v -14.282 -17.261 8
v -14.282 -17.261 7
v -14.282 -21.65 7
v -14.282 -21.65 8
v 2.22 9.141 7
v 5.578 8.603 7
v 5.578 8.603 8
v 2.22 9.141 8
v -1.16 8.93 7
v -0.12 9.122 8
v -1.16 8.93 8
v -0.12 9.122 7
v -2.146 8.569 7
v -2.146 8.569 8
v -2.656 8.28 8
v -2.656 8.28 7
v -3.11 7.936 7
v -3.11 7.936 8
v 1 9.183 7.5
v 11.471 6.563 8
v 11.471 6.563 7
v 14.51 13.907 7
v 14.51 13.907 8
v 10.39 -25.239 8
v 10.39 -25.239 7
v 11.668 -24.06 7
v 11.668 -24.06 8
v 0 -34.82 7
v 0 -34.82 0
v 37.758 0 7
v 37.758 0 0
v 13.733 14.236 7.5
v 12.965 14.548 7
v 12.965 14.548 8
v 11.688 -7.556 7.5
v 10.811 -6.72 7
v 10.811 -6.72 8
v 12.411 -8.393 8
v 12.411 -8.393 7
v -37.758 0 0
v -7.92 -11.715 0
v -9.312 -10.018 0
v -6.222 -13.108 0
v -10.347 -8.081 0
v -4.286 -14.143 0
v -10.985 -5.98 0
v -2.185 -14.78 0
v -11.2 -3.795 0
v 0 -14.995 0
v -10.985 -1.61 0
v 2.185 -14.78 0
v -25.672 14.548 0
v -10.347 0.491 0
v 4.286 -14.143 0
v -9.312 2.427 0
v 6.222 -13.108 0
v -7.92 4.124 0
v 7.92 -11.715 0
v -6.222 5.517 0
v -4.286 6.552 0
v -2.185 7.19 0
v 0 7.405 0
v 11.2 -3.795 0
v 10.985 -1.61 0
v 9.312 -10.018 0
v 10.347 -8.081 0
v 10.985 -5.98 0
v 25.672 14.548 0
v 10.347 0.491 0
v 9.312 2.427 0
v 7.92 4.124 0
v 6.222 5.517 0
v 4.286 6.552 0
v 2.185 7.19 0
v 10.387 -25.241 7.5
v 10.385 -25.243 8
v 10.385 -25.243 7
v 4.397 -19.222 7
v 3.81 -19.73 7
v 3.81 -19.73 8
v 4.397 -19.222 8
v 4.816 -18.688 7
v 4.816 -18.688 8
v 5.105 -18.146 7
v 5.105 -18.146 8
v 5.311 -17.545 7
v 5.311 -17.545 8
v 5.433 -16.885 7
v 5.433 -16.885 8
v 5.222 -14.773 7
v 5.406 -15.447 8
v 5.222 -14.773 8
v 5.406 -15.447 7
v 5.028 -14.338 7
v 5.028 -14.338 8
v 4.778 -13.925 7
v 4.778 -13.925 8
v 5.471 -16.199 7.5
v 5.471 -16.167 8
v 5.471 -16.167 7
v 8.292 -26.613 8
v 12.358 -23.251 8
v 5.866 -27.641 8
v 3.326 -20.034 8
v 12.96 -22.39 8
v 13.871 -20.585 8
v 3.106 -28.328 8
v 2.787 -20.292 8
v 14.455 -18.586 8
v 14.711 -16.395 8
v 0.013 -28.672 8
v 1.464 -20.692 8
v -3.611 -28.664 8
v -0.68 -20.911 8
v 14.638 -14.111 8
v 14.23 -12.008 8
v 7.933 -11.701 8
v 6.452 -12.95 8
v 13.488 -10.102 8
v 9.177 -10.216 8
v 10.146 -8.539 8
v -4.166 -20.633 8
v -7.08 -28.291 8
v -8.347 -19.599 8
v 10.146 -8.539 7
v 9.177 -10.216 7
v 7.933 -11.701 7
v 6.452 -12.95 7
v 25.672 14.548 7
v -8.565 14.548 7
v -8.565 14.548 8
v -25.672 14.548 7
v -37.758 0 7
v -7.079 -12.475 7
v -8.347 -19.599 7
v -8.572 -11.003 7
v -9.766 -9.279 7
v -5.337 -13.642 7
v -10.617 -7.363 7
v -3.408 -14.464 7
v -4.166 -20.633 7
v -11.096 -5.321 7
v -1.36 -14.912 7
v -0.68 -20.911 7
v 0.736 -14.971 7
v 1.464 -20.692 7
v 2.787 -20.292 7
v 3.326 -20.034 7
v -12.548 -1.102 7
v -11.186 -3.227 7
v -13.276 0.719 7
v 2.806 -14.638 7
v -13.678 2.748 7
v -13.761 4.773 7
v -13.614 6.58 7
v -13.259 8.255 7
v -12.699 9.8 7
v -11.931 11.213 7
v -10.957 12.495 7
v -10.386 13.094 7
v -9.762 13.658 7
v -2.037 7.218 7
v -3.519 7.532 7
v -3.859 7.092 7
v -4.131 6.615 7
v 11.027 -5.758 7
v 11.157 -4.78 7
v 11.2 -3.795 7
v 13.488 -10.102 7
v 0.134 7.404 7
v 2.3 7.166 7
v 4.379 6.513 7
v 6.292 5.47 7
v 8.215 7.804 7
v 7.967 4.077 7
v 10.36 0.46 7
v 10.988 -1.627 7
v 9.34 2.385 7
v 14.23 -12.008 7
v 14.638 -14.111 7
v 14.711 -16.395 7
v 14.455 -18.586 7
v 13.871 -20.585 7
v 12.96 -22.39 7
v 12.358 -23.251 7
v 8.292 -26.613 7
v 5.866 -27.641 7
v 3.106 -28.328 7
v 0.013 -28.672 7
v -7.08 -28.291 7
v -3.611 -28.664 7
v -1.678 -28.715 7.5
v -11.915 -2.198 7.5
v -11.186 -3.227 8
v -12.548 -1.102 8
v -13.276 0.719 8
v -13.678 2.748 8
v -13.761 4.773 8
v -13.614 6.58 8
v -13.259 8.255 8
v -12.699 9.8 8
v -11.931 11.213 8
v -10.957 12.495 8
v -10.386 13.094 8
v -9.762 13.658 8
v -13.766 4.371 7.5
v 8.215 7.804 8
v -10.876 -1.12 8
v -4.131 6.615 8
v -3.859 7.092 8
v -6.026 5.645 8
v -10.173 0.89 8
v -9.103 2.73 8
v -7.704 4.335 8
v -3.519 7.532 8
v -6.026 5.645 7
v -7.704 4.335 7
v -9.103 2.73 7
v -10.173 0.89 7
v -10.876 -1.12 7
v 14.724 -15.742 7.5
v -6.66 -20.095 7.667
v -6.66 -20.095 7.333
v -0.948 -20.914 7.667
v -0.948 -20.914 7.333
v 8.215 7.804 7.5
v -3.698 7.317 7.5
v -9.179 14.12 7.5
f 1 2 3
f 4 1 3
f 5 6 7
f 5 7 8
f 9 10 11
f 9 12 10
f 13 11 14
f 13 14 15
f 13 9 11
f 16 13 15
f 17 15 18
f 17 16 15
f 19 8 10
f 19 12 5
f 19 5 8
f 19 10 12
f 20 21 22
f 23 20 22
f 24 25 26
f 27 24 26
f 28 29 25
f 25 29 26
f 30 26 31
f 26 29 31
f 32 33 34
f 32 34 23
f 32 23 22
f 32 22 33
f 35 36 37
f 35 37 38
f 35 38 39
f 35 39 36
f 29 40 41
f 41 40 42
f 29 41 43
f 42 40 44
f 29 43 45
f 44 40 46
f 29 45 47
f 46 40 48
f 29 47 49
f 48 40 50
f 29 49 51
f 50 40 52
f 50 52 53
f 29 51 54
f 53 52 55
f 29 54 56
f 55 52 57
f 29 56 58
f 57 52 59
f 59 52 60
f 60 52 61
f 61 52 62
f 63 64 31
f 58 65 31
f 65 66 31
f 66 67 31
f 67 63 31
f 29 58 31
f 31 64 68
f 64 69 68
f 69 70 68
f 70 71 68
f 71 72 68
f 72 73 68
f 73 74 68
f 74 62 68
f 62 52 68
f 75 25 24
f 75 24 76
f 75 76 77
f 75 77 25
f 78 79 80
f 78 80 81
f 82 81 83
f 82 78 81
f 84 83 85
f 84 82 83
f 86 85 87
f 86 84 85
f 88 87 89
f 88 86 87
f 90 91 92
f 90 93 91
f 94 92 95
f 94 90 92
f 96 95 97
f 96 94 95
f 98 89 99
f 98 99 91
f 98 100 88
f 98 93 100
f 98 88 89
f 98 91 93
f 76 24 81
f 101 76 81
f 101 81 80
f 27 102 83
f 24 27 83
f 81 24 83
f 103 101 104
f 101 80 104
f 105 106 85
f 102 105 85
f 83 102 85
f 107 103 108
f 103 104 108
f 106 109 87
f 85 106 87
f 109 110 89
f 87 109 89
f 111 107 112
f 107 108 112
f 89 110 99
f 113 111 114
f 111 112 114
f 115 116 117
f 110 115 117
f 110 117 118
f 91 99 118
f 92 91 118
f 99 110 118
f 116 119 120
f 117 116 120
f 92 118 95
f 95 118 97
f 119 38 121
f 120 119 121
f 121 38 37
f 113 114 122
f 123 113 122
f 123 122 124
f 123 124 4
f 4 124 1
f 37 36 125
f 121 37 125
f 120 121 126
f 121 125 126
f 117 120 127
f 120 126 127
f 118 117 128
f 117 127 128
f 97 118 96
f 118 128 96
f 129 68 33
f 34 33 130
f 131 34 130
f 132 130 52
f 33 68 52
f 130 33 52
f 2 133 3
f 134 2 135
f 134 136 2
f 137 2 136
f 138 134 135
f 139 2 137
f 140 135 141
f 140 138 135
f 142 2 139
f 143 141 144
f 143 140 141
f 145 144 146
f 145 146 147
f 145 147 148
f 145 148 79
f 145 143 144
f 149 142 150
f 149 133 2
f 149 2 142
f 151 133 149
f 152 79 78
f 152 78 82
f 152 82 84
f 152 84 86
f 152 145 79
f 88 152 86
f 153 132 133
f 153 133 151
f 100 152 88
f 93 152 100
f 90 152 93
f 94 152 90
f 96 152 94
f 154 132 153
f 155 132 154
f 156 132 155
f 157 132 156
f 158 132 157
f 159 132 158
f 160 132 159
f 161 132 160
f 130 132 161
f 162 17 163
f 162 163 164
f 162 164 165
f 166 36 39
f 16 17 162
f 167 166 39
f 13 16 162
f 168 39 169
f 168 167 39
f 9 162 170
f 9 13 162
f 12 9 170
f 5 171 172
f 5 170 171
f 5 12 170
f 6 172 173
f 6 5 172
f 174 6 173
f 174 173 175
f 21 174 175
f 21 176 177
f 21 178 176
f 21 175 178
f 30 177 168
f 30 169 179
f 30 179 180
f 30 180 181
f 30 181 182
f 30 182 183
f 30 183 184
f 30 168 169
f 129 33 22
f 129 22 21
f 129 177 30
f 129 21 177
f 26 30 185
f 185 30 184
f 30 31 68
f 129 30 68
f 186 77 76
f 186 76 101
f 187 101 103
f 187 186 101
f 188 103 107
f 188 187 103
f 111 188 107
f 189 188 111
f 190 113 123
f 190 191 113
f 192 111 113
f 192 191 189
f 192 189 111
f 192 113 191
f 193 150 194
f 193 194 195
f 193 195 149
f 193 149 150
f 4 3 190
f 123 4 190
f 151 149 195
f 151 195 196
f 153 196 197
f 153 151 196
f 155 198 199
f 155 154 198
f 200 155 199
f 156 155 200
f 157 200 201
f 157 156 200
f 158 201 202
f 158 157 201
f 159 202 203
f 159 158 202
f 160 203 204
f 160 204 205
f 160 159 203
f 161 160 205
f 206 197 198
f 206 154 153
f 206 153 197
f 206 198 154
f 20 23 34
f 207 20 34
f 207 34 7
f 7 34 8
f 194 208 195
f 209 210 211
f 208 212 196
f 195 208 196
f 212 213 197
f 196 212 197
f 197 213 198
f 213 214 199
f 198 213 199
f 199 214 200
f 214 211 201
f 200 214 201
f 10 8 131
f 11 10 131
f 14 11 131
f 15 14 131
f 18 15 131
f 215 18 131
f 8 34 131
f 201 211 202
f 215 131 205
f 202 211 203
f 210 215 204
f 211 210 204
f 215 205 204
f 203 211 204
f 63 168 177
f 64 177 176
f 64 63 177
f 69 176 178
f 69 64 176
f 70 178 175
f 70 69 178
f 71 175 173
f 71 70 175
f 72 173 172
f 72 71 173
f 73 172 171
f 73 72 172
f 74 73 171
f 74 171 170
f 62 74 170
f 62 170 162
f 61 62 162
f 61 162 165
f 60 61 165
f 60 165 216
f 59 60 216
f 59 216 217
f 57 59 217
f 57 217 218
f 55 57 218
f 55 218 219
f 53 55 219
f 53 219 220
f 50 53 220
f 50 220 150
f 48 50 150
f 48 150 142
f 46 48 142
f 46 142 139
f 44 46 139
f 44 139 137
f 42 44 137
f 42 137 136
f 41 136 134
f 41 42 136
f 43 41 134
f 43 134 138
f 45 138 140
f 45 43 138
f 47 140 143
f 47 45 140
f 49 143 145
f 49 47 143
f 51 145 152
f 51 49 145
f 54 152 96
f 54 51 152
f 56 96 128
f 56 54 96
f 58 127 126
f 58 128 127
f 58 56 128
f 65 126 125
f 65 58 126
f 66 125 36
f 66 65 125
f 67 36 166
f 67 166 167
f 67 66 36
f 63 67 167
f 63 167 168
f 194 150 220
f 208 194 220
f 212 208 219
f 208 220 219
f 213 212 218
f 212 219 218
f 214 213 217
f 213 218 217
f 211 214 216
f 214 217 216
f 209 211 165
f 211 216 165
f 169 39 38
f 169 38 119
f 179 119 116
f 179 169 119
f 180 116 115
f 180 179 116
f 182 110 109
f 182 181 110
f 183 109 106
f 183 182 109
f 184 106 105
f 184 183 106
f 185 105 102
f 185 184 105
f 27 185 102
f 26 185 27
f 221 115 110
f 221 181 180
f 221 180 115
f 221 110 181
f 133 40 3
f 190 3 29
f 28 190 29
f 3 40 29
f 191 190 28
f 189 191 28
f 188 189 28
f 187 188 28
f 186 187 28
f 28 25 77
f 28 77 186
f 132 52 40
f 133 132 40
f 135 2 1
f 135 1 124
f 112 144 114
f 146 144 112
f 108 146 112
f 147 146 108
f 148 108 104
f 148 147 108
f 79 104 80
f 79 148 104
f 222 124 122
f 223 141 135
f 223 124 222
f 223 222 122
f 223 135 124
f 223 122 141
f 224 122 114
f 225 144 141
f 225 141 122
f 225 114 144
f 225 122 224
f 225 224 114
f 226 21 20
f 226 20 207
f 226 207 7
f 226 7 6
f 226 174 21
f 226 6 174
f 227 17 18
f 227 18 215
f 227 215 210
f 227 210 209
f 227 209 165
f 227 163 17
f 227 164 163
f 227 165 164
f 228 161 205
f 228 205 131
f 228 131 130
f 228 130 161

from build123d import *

# Parameters (mm, degrees)
F0_R     = 11.2
F1_DEPTH = 7
F3_DEPTH = 1


with BuildPart() as f1:
    # F0 (on Top) → F1 (new body)
    with BuildSketch(Plane.XY):
        Polygon((25.6720134951, 14.5481945947), (-25.6720134951, 14.5481945947), (-37.758209943, 0), (0, -34.8202470113), (37.758209943, 0), align=None)
        with Locations((0, -3.7951807026)):
            Circle(F0_R, mode=Mode.SUBTRACT)
    extrude(amount=F1_DEPTH)

    # F2 (on face) → F3 (join)
    with BuildSketch(Plane.XY.offset(7)):
        with BuildLine():
            add(Edge.make_bspline(
                [(14.7238187039, -15.7416694783), (14.7238187039, -20.8010980146), (11.6681145092, -24.0600274463)],
                knots=[0, 0, 0, 0.8391754789, 0.8391754789, 0.8391754789], degree=2))
            add(Edge.make_bspline(
                [(12.410573631, -8.3928551309), (14.7238187039, -11.3878987516), (14.7238187039, -15.7416694783)],
                knots=[0, 0, 0, 1, 1, 1], degree=2))
            add(Edge.make_bspline(
                [(10.8114000869, -6.7198393426), (11.7643435247, -7.5561572037), (12.410573631, -8.3928551309)],
                knots=[0.7206391515, 0.7206391515, 0.7206391515, 1, 1, 1], degree=2))
            ThreePointArc((10.8114000869, -6.7198393426), (8.586875435, -10.9858392444), (4.7778268514, -13.9249571353))
            add(Edge.make_bspline(
                [(5.4708384123, -16.1994485033), (5.4708384123, -14.9282205842), (4.7778268514, -13.9249571353)],
                knots=[0, 0, 0, 0.9740036675, 0.9740036675, 0.9740036675], degree=2))
            add(Edge.make_bspline(
                [(3.8101719494, -19.730190983), (5.4708384123, -18.5467835036), (5.4708384123, -16.1994485033)],
                knots=[0, 0, 0, 1, 1, 1], degree=2))
            add(Edge.make_bspline(
                [(-0.9478079163, -20.9135984624), (2.1495054866, -20.9135984624), (3.8101719494, -19.730190983)],
                knots=[0, 0, 0, 1, 1, 1], degree=2))
            add(Edge.make_bspline(
                [(-6.660305749, -20.095440205), (-3.538642398, -20.9135984624), (-0.9478079163, -20.9135984624)],
                knots=[0, 0, 0, 1, 1, 1], degree=2))
            add(Edge.make_bspline(
                [(-14.2818395155, -17.261106242), (-9.7819691, -19.2772819476), (-6.660305749, -20.095440205)],
                knots=[0, 0, 0, 1, 1, 1], degree=2))
            Line((-14.2818395155, -17.261106242), (-14.2818395155, -21.6496761485))
            Line((-14.2818395155, -21.6496761485), (-7.0797239554, -28.2913957424))
            add(Edge.make_bspline(
                [(-1.6783063604, -28.7153218451), (-4.5095721098, -28.7153218451), (-7.0797239554, -28.2913957424)],
                knots=[0, 0, 0, 0.3971106389, 0.3971106389, 0.3971106389], degree=2))
            add(Edge.make_bspline(
                [(10.3846579461, -25.2430192409), (6.0454971883, -28.7153218451), (-1.6783063604, -28.7153218451)],
                knots=[0, 0, 0, 1, 1, 1], degree=2))
            add(Edge.make_bspline(
                [(10.389586169, -25.239073611), (10.3871227576, -25.2410468384), (10.3846579461, -25.2430192409)],
                knots=[0.9994319612, 0.9994319612, 0.9994319612, 1, 1, 1], degree=2))
            Line((10.389586169, -25.239073611), (11.6681145092, -24.0600274463))
        make_face()
        with BuildLine():
            add(Edge.make_bspline(
                [(12.9648102038, 14.5481945947), (13.729785447, 14.2447942788), (14.5095391603, 13.9068273719)],
                knots=[0.7732095753, 0.7732095753, 0.7732095753, 1, 1, 1], degree=2))
            Line((12.9648102038, 14.5481945947), (-8.5649794853, 14.5481945947))
            add(Edge.make_bspline(
                [(-9.7624891415, 13.6584579009), (-9.1945173533, 14.1372954304), (-8.5649794853, 14.5481945947)],
                knots=[0, 0, 0, 0.1418818722, 0.1418818722, 0.1418818722], degree=2))
            add(Edge.make_bspline(
                [(-13.765620615, 4.3713876819), (-13.765620615, 10.2835550893), (-9.7624891415, 13.6584579009)],
                knots=[0, 0, 0, 1, 1, 1], degree=2))
            add(Edge.make_bspline(
                [(-12.5481232082, -1.102480659), (-13.765620615, 1.2448543413), (-13.765620615, 4.3713876819)],
                knots=[0, 0, 0, 1, 1, 1], degree=2))
            add(Edge.make_bspline(
                [(-11.1855575293, -3.2265835185), (-11.962161159, -2.23221549), (-12.5481232082, -1.102480659)],
                knots=[0.5187159775, 0.5187159775, 0.5187159775, 1, 1, 1], degree=2))
            ThreePointArc((-11.1855575293, -3.2265835185), (-9.1028902875, 2.7299544235), (-4.1307340981, 6.6152484822))
            add(Edge.make_bspline(
                [(-3.1100833108, 7.936220089), (-3.7746308536, 7.3575664463), (-4.1307340981, 6.6152484822)],
                knots=[0, 0, 0, 0.4641418083, 0.4641418083, 0.4641418083], degree=2))
            add(Edge.make_bspline(
                [(1.0001879346, 9.1829374336), (-1.6783063604, 9.1829374336), (-3.1100833108, 7.936220089)],
                knots=[0, 0, 0, 1, 1, 1], degree=2))
            add(Edge.make_bspline(
                [(5.5779781841, 8.6034086679), (3.2501231423, 9.1829374336), (1.0001879346, 9.1829374336)],
                knots=[0, 0, 0, 1, 1, 1], degree=2))
            add(Edge.make_bspline(
                [(11.470665633, 6.5628830141), (7.9058332259, 8.0238799023), (5.5779781841, 8.6034086679)],
                knots=[0, 0, 0, 1, 1, 1], degree=2))
            Line((11.470665633, 6.5628830141), (14.5095391603, 13.9068273719))
        make_face()
    extrude(amount=F3_DEPTH)


solid = f1.part
